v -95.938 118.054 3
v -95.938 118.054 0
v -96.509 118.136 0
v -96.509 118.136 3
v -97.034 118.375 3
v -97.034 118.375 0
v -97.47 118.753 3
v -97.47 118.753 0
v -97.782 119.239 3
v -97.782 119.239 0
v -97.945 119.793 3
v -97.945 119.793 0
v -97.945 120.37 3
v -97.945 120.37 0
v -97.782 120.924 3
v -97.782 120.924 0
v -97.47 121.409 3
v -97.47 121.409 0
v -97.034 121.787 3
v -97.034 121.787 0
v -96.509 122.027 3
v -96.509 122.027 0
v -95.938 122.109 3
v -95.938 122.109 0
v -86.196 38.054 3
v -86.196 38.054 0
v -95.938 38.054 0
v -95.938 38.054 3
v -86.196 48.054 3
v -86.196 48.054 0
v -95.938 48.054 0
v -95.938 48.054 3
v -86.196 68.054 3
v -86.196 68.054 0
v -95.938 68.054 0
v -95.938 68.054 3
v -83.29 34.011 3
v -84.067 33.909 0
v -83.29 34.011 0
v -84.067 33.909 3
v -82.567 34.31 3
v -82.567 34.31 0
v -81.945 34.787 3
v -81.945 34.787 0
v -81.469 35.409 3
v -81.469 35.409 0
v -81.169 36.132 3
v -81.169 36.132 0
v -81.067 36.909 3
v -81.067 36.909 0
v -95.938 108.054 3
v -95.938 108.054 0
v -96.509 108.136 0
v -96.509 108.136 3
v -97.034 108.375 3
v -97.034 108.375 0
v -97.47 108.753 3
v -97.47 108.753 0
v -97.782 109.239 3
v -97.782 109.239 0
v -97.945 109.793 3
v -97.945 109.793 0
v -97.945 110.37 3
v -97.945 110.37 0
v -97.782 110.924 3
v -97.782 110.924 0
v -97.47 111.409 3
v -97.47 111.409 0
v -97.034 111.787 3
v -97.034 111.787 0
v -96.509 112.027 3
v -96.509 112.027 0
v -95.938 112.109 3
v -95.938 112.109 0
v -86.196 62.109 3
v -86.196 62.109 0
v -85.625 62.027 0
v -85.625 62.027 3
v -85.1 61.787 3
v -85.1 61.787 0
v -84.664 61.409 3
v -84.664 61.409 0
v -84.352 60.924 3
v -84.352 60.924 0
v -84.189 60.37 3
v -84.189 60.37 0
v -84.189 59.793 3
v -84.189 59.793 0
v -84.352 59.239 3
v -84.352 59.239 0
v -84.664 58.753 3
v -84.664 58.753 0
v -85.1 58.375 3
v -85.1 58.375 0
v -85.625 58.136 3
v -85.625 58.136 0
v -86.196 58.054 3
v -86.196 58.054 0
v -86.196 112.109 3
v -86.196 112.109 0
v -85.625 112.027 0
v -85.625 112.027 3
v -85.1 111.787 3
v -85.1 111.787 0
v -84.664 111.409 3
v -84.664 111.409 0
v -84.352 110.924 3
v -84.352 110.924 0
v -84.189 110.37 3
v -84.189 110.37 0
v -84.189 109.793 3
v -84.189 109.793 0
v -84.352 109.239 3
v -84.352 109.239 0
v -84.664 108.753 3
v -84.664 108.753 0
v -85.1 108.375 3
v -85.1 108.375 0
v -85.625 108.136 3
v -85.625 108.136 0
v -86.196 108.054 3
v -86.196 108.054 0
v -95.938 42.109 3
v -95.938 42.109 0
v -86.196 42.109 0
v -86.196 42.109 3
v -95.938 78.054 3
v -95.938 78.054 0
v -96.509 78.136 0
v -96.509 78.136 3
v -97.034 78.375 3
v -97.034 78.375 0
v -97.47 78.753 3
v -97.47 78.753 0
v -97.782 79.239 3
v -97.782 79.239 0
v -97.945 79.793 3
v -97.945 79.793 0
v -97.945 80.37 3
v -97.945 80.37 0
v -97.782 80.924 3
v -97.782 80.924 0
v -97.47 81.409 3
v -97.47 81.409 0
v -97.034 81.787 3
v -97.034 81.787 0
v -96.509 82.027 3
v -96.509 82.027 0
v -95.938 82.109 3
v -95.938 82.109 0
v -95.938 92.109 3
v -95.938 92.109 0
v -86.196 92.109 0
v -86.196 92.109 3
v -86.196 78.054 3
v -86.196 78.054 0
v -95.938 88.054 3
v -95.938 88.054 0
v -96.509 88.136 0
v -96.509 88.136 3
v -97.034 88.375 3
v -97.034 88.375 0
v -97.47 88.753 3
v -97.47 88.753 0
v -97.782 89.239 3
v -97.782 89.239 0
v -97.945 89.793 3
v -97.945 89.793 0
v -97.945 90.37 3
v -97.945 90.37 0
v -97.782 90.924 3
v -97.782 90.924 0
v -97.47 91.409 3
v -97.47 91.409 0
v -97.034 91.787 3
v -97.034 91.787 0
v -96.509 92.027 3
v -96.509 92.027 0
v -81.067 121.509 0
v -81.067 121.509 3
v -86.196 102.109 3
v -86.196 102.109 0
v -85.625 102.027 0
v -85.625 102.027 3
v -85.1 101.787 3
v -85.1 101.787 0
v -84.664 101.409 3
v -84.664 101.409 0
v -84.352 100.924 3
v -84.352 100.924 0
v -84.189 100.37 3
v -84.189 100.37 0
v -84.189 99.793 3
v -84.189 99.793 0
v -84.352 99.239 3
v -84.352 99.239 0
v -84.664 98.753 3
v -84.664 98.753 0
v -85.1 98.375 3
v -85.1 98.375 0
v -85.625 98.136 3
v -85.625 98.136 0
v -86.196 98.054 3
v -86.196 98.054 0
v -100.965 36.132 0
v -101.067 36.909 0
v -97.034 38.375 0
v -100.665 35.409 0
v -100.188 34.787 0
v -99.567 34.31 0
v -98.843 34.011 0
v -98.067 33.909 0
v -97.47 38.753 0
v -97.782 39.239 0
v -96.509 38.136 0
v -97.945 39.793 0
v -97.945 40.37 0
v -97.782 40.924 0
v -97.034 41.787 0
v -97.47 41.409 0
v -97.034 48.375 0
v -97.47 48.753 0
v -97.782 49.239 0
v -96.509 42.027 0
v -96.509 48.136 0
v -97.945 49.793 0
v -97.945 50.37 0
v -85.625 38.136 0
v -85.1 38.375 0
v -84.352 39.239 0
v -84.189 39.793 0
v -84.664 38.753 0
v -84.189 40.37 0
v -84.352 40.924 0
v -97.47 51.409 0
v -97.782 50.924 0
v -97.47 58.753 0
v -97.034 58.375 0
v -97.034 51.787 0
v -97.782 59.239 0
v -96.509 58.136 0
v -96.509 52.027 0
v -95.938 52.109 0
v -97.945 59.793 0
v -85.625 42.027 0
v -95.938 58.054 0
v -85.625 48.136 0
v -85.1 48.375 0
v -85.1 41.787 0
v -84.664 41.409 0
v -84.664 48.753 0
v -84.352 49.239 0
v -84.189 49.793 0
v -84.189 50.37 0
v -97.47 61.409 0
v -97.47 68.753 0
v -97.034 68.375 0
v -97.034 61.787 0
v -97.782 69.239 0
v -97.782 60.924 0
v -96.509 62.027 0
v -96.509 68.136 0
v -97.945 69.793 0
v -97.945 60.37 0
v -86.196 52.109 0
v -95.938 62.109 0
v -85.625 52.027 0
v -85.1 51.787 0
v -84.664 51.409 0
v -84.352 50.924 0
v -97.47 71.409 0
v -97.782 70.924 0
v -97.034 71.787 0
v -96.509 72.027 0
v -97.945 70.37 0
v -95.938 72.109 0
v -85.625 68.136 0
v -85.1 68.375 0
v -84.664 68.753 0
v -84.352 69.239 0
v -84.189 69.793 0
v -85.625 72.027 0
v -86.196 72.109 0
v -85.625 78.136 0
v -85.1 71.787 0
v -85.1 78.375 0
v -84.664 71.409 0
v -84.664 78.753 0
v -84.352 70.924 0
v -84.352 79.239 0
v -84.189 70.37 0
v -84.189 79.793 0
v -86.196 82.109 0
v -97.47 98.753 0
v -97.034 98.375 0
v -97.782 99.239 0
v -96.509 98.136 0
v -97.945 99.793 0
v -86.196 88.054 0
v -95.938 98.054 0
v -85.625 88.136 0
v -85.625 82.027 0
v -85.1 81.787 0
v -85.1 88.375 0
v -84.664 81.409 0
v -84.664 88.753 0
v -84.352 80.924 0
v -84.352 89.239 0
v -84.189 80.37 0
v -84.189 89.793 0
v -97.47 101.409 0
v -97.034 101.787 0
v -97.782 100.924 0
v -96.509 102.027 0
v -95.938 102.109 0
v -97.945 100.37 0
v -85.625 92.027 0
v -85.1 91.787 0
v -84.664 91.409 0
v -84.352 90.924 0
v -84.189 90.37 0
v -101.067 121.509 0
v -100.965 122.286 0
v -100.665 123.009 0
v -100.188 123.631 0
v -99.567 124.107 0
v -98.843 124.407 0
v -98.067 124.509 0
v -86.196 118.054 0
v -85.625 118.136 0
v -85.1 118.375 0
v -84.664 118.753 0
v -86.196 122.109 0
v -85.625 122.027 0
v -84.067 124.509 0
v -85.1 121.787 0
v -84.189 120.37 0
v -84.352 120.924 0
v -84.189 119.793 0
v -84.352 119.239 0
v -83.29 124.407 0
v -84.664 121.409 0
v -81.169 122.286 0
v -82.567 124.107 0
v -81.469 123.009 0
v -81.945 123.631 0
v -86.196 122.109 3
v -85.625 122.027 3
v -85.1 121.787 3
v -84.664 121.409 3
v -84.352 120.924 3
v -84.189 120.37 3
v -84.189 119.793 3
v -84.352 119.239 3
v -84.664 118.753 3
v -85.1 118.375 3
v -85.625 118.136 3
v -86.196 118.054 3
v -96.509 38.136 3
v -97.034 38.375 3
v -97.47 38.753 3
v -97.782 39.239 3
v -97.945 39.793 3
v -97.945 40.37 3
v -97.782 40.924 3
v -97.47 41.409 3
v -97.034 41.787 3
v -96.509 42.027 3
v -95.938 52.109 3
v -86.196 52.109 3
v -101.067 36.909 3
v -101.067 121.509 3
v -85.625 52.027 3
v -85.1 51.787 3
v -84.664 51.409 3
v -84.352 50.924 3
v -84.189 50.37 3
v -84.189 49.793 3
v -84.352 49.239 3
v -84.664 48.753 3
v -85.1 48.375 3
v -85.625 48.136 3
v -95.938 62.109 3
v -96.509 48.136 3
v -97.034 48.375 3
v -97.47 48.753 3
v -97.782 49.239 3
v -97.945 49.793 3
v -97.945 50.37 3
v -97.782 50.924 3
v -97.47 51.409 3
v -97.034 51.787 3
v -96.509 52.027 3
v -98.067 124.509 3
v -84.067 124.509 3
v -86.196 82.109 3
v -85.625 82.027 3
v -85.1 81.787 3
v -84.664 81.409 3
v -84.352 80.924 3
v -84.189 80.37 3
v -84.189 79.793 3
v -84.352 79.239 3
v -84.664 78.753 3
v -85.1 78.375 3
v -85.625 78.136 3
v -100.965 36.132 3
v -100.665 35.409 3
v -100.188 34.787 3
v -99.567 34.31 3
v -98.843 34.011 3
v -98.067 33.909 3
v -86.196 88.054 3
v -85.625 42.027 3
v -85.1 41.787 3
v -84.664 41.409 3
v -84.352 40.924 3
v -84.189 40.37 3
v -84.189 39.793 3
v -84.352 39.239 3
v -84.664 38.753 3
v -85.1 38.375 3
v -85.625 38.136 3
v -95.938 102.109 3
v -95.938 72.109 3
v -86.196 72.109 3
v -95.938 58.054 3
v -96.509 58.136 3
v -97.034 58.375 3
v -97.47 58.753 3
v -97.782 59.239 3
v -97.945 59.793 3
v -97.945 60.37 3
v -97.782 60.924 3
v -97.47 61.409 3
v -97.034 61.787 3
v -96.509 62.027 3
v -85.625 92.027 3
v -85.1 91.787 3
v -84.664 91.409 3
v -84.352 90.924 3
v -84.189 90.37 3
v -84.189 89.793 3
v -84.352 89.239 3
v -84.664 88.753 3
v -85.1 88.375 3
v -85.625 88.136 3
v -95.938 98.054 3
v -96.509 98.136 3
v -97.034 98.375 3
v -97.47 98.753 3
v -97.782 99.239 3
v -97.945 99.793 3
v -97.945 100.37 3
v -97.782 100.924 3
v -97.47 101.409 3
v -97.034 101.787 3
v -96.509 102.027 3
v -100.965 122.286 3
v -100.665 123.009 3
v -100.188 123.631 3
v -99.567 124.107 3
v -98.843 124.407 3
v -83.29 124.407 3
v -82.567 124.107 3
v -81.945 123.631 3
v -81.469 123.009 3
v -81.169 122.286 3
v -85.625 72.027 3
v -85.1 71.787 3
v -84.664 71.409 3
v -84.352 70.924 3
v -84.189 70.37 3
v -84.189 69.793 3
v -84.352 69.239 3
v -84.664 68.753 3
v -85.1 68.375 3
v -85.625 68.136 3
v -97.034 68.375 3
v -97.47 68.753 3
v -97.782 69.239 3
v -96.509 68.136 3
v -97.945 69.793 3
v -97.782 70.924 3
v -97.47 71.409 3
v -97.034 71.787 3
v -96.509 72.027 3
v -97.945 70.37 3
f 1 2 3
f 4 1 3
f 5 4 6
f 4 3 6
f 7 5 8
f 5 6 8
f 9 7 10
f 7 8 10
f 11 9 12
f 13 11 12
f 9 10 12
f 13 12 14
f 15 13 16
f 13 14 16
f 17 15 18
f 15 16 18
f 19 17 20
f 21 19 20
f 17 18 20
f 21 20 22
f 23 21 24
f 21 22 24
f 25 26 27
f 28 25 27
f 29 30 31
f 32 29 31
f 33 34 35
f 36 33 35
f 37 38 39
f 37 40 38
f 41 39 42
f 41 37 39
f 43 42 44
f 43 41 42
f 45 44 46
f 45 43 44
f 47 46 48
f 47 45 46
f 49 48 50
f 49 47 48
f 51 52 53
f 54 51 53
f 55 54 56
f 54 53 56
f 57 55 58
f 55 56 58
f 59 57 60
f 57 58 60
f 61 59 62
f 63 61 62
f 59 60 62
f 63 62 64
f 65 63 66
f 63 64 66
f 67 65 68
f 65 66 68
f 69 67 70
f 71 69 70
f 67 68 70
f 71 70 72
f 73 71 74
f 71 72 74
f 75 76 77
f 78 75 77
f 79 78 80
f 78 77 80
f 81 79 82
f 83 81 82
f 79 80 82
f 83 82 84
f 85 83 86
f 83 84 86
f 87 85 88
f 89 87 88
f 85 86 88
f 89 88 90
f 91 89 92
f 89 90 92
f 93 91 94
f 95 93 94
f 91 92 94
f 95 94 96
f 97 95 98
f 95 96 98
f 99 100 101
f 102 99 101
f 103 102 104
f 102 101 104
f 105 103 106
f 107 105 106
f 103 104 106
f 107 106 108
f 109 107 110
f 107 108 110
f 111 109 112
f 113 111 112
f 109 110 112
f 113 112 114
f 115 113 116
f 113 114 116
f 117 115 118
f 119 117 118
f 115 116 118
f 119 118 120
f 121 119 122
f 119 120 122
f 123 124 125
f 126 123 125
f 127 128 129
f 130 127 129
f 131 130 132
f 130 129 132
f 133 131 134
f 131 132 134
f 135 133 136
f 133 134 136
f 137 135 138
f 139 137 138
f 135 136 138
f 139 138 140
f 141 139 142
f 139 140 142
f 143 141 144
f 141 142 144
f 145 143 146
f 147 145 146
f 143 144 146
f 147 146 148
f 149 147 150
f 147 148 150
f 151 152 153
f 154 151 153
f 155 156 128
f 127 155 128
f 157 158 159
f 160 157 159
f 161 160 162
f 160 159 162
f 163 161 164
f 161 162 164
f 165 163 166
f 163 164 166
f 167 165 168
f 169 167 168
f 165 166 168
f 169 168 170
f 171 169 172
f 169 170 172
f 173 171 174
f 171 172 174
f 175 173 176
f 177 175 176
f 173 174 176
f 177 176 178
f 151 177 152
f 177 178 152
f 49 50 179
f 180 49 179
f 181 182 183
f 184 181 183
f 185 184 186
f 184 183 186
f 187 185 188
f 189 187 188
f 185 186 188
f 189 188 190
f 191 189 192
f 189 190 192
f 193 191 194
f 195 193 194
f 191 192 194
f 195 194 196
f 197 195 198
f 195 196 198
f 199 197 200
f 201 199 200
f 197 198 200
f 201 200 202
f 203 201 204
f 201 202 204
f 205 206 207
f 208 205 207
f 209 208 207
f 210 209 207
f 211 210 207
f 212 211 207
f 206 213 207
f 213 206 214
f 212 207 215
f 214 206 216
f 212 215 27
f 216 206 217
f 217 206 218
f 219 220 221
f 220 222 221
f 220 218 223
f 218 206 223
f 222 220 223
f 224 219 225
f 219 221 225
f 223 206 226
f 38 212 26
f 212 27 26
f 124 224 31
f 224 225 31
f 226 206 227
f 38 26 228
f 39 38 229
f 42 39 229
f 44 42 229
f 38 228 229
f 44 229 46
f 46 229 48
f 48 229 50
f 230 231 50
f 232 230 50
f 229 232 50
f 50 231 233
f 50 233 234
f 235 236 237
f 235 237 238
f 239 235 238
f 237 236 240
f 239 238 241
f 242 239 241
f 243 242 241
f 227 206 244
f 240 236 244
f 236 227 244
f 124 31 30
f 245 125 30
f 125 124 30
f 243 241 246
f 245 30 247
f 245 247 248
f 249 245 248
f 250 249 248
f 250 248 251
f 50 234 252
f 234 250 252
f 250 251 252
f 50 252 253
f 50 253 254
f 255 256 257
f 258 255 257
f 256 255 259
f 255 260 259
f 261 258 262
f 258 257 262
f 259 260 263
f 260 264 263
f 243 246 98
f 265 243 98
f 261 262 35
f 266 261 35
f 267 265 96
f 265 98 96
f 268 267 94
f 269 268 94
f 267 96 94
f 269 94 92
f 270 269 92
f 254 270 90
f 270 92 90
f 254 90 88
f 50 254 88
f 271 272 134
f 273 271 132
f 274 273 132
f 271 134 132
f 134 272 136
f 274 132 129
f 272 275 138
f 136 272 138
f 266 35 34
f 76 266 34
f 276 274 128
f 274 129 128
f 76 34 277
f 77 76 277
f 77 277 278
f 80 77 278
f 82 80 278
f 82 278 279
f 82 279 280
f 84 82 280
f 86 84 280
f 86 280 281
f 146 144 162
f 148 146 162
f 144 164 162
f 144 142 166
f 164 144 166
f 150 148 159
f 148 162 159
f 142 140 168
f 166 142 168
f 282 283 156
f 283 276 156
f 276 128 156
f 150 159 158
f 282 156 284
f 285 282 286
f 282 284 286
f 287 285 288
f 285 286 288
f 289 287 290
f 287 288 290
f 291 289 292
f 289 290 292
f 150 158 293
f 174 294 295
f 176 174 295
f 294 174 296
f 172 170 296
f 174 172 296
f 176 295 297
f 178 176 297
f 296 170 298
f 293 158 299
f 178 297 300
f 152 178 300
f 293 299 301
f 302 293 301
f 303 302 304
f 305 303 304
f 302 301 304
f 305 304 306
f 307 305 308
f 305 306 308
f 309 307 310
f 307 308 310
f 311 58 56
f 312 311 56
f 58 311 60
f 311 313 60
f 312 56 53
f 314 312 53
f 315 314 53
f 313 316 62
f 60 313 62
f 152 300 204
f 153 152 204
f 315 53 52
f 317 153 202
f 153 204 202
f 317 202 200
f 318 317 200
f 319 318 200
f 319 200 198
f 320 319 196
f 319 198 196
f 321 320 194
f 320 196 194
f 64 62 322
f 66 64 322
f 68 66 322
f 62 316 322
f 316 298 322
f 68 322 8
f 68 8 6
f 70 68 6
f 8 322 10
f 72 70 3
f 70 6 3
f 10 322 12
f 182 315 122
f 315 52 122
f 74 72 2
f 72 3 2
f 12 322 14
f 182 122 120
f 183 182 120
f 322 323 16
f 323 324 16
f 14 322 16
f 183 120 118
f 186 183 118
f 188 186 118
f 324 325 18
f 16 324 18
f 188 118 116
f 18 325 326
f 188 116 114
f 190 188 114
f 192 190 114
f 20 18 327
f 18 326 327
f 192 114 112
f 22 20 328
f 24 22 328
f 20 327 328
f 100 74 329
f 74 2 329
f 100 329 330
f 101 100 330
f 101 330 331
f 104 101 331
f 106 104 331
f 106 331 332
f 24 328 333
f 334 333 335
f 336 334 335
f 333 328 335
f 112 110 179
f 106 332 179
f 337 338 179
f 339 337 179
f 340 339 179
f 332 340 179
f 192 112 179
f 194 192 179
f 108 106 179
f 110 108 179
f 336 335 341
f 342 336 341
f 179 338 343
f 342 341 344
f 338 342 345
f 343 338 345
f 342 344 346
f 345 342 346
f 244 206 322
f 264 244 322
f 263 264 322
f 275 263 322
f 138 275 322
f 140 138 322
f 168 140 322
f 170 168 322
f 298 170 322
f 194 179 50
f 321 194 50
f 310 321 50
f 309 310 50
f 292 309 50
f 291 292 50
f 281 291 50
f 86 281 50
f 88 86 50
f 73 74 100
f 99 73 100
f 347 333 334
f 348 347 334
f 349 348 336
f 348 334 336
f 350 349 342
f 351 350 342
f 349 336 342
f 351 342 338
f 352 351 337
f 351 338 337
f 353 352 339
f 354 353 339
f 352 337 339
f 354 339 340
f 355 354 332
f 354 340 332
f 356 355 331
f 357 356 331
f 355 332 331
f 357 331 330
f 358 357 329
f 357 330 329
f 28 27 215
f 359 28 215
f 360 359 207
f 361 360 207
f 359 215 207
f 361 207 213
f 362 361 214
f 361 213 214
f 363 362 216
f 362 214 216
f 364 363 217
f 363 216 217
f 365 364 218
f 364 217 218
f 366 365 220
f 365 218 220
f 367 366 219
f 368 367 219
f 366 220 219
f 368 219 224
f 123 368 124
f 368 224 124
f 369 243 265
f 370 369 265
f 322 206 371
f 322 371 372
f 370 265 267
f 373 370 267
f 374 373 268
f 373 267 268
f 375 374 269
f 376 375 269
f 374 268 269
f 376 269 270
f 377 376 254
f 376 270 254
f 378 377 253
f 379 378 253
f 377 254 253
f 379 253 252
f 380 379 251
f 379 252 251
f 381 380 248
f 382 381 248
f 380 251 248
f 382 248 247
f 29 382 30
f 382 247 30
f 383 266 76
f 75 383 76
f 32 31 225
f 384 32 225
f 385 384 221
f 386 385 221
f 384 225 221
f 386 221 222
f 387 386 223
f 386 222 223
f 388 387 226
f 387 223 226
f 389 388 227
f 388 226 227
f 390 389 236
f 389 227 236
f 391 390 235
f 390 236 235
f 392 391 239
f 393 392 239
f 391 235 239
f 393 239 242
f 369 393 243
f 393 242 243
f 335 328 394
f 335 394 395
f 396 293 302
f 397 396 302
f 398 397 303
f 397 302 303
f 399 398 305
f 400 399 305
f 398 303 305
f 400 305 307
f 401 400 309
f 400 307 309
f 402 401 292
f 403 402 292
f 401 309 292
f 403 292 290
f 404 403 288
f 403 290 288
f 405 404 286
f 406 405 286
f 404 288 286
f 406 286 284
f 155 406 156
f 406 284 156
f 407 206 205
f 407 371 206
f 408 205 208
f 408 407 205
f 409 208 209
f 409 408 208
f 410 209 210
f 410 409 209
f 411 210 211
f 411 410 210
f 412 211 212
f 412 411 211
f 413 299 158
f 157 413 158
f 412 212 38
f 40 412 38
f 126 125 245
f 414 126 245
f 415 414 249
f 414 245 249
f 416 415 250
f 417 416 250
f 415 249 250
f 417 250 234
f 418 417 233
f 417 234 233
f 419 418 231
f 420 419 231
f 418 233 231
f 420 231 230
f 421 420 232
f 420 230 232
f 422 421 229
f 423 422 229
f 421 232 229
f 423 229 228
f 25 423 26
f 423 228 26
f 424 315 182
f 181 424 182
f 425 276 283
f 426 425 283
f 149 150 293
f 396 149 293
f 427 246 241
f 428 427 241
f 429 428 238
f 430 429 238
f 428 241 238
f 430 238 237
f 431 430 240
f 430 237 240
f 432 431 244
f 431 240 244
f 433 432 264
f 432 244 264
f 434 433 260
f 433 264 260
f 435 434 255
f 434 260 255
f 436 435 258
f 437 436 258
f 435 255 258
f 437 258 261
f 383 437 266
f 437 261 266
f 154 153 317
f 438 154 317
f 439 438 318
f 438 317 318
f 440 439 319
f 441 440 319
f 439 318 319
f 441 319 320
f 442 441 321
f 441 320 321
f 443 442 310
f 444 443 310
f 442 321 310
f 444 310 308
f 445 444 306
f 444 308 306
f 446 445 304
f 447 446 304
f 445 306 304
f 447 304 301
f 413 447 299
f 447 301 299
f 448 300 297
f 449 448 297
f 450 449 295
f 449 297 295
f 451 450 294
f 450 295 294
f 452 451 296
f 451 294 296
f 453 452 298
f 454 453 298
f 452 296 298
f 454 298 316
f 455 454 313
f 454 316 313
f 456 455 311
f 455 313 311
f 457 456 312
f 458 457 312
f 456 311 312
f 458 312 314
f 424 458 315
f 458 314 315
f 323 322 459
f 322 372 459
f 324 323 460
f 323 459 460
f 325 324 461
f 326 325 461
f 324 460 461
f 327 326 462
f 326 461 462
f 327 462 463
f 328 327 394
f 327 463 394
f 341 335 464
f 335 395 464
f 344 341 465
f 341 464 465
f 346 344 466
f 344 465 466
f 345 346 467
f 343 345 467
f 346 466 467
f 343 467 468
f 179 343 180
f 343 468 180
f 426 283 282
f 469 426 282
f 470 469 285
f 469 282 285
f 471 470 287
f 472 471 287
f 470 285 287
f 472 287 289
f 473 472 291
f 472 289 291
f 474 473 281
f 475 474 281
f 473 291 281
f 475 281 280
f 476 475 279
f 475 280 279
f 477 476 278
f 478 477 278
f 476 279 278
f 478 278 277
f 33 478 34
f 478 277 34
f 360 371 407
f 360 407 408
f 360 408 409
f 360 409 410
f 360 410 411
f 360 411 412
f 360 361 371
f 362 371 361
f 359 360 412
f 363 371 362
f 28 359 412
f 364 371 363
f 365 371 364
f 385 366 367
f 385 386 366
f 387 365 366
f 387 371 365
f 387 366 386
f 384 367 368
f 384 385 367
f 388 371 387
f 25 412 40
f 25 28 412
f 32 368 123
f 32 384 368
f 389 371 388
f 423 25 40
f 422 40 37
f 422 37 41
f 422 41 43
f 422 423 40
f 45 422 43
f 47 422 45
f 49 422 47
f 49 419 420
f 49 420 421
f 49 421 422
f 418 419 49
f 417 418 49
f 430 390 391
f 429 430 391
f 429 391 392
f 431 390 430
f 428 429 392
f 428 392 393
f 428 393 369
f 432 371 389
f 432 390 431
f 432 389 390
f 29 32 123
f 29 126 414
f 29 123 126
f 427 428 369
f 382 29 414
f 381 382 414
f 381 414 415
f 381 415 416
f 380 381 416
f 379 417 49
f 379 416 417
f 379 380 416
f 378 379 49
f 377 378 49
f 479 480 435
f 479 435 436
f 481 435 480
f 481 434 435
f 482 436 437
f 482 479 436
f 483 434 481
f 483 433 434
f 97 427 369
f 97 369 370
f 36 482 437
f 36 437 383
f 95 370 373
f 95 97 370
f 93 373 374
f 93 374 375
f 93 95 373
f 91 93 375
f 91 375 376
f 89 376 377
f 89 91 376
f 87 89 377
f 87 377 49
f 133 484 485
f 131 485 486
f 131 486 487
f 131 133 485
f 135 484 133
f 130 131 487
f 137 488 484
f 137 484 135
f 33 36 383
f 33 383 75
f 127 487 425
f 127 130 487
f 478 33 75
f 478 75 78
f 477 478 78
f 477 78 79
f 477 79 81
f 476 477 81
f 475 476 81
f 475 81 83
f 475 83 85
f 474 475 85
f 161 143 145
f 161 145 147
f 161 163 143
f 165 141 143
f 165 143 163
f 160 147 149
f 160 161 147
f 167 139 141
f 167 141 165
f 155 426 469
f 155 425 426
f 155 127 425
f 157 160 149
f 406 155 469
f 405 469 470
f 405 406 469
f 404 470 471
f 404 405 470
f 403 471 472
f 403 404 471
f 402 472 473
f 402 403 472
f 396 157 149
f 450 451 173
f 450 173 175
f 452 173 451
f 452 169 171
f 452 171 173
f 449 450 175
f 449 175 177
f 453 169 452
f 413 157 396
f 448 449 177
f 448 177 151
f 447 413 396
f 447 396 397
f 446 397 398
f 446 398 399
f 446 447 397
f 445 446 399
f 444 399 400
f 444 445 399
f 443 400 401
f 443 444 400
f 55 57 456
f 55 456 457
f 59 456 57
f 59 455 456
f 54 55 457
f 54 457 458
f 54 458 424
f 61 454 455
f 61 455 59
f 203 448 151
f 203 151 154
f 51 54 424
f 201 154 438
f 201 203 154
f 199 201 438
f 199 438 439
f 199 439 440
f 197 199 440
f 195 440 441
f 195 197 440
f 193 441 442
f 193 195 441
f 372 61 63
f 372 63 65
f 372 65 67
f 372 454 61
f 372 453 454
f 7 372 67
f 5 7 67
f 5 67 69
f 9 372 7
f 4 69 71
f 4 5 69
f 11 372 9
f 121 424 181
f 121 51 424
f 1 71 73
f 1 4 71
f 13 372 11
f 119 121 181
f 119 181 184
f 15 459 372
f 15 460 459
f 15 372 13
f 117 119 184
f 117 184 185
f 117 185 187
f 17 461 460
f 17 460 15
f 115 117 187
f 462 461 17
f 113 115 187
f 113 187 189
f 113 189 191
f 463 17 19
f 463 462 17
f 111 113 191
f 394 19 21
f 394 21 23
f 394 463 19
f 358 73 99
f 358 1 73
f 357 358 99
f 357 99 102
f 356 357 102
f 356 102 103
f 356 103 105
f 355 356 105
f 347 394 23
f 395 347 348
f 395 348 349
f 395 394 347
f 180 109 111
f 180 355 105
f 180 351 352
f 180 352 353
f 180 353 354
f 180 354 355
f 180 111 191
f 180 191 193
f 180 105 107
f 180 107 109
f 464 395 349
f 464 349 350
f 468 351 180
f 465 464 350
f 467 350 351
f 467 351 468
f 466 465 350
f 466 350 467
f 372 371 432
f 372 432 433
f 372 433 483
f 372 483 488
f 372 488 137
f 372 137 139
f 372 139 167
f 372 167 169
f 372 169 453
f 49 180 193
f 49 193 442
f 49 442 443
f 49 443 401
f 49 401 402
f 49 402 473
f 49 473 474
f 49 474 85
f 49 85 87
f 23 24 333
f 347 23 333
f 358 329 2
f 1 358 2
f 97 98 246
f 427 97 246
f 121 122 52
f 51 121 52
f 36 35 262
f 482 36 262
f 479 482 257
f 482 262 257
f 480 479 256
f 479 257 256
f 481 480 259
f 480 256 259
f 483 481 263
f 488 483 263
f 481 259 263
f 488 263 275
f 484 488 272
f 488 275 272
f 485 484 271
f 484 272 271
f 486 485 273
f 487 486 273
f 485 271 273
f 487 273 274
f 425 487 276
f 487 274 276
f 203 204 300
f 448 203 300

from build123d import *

# Parameters (mm, degrees)
SKETCH1_W           = 20
SKETCH1_H           = 90.600658981
BOSS_EXTRUDE1_DEPTH = 3
FILLET1_R           = 3


with BuildPart() as part:
    # Sketch1 → Boss-Extrude1 (new body)
    with BuildSketch(Plane.XY):
        with Locations((-91.066816784, 79.208884685)):
            Rectangle(SKETCH1_W, SKETCH1_H)
        with BuildLine():
            Line((-86.19596438, 38.053580074), (-95.937669189, 38.053580074))
            ThreePointArc((-95.937669189, 38.053580074), (-97.965327886, 40.081238771), (-95.937669189, 42.108897468))
            Line((-95.937669189, 42.108897468), (-86.19596438, 42.108897468))
            ThreePointArc((-86.19596438, 42.108897468), (-84.168305683, 40.081238771), (-86.19596438, 38.053580074))
        make_face(mode=Mode.SUBTRACT)
        with BuildLine():
            Line((-86.19596438, 48.053580074), (-95.937669189, 48.053580074))
            ThreePointArc((-95.937669189, 48.053580074), (-97.965327886, 50.081238771), (-95.937669189, 52.108897468))
            Line((-95.937669189, 52.108897468), (-86.19596438, 52.108897468))
            ThreePointArc((-86.19596438, 52.108897468), (-84.168305683, 50.081238771), (-86.19596438, 48.053580074))
        make_face(mode=Mode.SUBTRACT)
        with BuildLine():
            Line((-86.19596438, 58.053580074), (-95.937669189, 58.053580074))
            ThreePointArc((-95.937669189, 58.053580074), (-97.965327886, 60.081238771), (-95.937669189, 62.108897468))
            Line((-95.937669189, 62.108897468), (-86.19596438, 62.108897468))
            ThreePointArc((-86.19596438, 62.108897468), (-84.168305683, 60.081238771), (-86.19596438, 58.053580074))
        make_face(mode=Mode.SUBTRACT)
        with BuildLine():
            Line((-86.19596438, 68.053580074), (-95.937669189, 68.053580074))
            ThreePointArc((-95.937669189, 68.053580074), (-97.965327886, 70.081238771), (-95.937669189, 72.108897468))
            Line((-95.937669189, 72.108897468), (-86.19596438, 72.108897468))
            ThreePointArc((-86.19596438, 72.108897468), (-84.168305683, 70.081238771), (-86.19596438, 68.053580074))
        make_face(mode=Mode.SUBTRACT)
        with BuildLine():
            Line((-86.19596438, 78.053580074), (-95.937669189, 78.053580074))
            ThreePointArc((-95.937669189, 78.053580074), (-97.965327886, 80.081238771), (-95.937669189, 82.108897468))
            Line((-95.937669189, 82.108897468), (-86.19596438, 82.108897468))
            ThreePointArc((-86.19596438, 82.108897468), (-84.168305683, 80.081238771), (-86.19596438, 78.053580074))
        make_face(mode=Mode.SUBTRACT)
        with BuildLine():
            Line((-86.19596438, 88.053580074), (-95.937669189, 88.053580074))
            ThreePointArc((-95.937669189, 88.053580074), (-97.965327886, 90.081238771), (-95.937669189, 92.108897468))
            Line((-95.937669189, 92.108897468), (-86.19596438, 92.108897468))
            ThreePointArc((-86.19596438, 92.108897468), (-84.168305683, 90.081238771), (-86.19596438, 88.053580074))
        make_face(mode=Mode.SUBTRACT)
        with BuildLine():
            Line((-86.19596438, 98.053580074), (-95.937669189, 98.053580074))
            ThreePointArc((-95.937669189, 98.053580074), (-97.965327886, 100.081238771), (-95.937669189, 102.108897468))
            Line((-95.937669189, 102.108897468), (-86.19596438, 102.108897468))
            ThreePointArc((-86.19596438, 102.108897468), (-84.168305683, 100.081238771), (-86.19596438, 98.053580074))
        make_face(mode=Mode.SUBTRACT)
        with BuildLine():
            Line((-86.19596438, 108.053580074), (-95.937669189, 108.053580074))
            ThreePointArc((-95.937669189, 108.053580074), (-97.965327886, 110.081238771), (-95.937669189, 112.108897468))
            Line((-95.937669189, 112.108897468), (-86.19596438, 112.108897468))
            ThreePointArc((-86.19596438, 112.108897468), (-84.168305683, 110.081238771), (-86.19596438, 108.053580074))
        make_face(mode=Mode.SUBTRACT)
        with BuildLine():
            Line((-86.19596438, 118.053580074), (-95.937669189, 118.053580074))
            ThreePointArc((-95.937669189, 118.053580074), (-97.965327886, 120.081238771), (-95.937669189, 122.108897468))
            Line((-95.937669189, 122.108897468), (-86.19596438, 122.108897468))
            ThreePointArc((-86.19596438, 122.108897468), (-84.168305683, 120.081238771), (-86.19596438, 118.053580074))
        make_face(mode=Mode.SUBTRACT)
    extrude(amount=BOSS_EXTRUDE1_DEPTH)

    # Fillet1
    fillet1_edges = [part.edges().sort_by_distance(p)[0] for p in [
        (-101.066816784, 124.509214175, 1.5),
        (-81.066816784, 124.509214175, 1.5),
        (-81.066816784, 33.908555194, 1.5),
        (-101.066816784, 33.908555194, 1.5),
    ]]
    fillet(fillet1_edges, radius=FILLET1_R)


solid = part.part
